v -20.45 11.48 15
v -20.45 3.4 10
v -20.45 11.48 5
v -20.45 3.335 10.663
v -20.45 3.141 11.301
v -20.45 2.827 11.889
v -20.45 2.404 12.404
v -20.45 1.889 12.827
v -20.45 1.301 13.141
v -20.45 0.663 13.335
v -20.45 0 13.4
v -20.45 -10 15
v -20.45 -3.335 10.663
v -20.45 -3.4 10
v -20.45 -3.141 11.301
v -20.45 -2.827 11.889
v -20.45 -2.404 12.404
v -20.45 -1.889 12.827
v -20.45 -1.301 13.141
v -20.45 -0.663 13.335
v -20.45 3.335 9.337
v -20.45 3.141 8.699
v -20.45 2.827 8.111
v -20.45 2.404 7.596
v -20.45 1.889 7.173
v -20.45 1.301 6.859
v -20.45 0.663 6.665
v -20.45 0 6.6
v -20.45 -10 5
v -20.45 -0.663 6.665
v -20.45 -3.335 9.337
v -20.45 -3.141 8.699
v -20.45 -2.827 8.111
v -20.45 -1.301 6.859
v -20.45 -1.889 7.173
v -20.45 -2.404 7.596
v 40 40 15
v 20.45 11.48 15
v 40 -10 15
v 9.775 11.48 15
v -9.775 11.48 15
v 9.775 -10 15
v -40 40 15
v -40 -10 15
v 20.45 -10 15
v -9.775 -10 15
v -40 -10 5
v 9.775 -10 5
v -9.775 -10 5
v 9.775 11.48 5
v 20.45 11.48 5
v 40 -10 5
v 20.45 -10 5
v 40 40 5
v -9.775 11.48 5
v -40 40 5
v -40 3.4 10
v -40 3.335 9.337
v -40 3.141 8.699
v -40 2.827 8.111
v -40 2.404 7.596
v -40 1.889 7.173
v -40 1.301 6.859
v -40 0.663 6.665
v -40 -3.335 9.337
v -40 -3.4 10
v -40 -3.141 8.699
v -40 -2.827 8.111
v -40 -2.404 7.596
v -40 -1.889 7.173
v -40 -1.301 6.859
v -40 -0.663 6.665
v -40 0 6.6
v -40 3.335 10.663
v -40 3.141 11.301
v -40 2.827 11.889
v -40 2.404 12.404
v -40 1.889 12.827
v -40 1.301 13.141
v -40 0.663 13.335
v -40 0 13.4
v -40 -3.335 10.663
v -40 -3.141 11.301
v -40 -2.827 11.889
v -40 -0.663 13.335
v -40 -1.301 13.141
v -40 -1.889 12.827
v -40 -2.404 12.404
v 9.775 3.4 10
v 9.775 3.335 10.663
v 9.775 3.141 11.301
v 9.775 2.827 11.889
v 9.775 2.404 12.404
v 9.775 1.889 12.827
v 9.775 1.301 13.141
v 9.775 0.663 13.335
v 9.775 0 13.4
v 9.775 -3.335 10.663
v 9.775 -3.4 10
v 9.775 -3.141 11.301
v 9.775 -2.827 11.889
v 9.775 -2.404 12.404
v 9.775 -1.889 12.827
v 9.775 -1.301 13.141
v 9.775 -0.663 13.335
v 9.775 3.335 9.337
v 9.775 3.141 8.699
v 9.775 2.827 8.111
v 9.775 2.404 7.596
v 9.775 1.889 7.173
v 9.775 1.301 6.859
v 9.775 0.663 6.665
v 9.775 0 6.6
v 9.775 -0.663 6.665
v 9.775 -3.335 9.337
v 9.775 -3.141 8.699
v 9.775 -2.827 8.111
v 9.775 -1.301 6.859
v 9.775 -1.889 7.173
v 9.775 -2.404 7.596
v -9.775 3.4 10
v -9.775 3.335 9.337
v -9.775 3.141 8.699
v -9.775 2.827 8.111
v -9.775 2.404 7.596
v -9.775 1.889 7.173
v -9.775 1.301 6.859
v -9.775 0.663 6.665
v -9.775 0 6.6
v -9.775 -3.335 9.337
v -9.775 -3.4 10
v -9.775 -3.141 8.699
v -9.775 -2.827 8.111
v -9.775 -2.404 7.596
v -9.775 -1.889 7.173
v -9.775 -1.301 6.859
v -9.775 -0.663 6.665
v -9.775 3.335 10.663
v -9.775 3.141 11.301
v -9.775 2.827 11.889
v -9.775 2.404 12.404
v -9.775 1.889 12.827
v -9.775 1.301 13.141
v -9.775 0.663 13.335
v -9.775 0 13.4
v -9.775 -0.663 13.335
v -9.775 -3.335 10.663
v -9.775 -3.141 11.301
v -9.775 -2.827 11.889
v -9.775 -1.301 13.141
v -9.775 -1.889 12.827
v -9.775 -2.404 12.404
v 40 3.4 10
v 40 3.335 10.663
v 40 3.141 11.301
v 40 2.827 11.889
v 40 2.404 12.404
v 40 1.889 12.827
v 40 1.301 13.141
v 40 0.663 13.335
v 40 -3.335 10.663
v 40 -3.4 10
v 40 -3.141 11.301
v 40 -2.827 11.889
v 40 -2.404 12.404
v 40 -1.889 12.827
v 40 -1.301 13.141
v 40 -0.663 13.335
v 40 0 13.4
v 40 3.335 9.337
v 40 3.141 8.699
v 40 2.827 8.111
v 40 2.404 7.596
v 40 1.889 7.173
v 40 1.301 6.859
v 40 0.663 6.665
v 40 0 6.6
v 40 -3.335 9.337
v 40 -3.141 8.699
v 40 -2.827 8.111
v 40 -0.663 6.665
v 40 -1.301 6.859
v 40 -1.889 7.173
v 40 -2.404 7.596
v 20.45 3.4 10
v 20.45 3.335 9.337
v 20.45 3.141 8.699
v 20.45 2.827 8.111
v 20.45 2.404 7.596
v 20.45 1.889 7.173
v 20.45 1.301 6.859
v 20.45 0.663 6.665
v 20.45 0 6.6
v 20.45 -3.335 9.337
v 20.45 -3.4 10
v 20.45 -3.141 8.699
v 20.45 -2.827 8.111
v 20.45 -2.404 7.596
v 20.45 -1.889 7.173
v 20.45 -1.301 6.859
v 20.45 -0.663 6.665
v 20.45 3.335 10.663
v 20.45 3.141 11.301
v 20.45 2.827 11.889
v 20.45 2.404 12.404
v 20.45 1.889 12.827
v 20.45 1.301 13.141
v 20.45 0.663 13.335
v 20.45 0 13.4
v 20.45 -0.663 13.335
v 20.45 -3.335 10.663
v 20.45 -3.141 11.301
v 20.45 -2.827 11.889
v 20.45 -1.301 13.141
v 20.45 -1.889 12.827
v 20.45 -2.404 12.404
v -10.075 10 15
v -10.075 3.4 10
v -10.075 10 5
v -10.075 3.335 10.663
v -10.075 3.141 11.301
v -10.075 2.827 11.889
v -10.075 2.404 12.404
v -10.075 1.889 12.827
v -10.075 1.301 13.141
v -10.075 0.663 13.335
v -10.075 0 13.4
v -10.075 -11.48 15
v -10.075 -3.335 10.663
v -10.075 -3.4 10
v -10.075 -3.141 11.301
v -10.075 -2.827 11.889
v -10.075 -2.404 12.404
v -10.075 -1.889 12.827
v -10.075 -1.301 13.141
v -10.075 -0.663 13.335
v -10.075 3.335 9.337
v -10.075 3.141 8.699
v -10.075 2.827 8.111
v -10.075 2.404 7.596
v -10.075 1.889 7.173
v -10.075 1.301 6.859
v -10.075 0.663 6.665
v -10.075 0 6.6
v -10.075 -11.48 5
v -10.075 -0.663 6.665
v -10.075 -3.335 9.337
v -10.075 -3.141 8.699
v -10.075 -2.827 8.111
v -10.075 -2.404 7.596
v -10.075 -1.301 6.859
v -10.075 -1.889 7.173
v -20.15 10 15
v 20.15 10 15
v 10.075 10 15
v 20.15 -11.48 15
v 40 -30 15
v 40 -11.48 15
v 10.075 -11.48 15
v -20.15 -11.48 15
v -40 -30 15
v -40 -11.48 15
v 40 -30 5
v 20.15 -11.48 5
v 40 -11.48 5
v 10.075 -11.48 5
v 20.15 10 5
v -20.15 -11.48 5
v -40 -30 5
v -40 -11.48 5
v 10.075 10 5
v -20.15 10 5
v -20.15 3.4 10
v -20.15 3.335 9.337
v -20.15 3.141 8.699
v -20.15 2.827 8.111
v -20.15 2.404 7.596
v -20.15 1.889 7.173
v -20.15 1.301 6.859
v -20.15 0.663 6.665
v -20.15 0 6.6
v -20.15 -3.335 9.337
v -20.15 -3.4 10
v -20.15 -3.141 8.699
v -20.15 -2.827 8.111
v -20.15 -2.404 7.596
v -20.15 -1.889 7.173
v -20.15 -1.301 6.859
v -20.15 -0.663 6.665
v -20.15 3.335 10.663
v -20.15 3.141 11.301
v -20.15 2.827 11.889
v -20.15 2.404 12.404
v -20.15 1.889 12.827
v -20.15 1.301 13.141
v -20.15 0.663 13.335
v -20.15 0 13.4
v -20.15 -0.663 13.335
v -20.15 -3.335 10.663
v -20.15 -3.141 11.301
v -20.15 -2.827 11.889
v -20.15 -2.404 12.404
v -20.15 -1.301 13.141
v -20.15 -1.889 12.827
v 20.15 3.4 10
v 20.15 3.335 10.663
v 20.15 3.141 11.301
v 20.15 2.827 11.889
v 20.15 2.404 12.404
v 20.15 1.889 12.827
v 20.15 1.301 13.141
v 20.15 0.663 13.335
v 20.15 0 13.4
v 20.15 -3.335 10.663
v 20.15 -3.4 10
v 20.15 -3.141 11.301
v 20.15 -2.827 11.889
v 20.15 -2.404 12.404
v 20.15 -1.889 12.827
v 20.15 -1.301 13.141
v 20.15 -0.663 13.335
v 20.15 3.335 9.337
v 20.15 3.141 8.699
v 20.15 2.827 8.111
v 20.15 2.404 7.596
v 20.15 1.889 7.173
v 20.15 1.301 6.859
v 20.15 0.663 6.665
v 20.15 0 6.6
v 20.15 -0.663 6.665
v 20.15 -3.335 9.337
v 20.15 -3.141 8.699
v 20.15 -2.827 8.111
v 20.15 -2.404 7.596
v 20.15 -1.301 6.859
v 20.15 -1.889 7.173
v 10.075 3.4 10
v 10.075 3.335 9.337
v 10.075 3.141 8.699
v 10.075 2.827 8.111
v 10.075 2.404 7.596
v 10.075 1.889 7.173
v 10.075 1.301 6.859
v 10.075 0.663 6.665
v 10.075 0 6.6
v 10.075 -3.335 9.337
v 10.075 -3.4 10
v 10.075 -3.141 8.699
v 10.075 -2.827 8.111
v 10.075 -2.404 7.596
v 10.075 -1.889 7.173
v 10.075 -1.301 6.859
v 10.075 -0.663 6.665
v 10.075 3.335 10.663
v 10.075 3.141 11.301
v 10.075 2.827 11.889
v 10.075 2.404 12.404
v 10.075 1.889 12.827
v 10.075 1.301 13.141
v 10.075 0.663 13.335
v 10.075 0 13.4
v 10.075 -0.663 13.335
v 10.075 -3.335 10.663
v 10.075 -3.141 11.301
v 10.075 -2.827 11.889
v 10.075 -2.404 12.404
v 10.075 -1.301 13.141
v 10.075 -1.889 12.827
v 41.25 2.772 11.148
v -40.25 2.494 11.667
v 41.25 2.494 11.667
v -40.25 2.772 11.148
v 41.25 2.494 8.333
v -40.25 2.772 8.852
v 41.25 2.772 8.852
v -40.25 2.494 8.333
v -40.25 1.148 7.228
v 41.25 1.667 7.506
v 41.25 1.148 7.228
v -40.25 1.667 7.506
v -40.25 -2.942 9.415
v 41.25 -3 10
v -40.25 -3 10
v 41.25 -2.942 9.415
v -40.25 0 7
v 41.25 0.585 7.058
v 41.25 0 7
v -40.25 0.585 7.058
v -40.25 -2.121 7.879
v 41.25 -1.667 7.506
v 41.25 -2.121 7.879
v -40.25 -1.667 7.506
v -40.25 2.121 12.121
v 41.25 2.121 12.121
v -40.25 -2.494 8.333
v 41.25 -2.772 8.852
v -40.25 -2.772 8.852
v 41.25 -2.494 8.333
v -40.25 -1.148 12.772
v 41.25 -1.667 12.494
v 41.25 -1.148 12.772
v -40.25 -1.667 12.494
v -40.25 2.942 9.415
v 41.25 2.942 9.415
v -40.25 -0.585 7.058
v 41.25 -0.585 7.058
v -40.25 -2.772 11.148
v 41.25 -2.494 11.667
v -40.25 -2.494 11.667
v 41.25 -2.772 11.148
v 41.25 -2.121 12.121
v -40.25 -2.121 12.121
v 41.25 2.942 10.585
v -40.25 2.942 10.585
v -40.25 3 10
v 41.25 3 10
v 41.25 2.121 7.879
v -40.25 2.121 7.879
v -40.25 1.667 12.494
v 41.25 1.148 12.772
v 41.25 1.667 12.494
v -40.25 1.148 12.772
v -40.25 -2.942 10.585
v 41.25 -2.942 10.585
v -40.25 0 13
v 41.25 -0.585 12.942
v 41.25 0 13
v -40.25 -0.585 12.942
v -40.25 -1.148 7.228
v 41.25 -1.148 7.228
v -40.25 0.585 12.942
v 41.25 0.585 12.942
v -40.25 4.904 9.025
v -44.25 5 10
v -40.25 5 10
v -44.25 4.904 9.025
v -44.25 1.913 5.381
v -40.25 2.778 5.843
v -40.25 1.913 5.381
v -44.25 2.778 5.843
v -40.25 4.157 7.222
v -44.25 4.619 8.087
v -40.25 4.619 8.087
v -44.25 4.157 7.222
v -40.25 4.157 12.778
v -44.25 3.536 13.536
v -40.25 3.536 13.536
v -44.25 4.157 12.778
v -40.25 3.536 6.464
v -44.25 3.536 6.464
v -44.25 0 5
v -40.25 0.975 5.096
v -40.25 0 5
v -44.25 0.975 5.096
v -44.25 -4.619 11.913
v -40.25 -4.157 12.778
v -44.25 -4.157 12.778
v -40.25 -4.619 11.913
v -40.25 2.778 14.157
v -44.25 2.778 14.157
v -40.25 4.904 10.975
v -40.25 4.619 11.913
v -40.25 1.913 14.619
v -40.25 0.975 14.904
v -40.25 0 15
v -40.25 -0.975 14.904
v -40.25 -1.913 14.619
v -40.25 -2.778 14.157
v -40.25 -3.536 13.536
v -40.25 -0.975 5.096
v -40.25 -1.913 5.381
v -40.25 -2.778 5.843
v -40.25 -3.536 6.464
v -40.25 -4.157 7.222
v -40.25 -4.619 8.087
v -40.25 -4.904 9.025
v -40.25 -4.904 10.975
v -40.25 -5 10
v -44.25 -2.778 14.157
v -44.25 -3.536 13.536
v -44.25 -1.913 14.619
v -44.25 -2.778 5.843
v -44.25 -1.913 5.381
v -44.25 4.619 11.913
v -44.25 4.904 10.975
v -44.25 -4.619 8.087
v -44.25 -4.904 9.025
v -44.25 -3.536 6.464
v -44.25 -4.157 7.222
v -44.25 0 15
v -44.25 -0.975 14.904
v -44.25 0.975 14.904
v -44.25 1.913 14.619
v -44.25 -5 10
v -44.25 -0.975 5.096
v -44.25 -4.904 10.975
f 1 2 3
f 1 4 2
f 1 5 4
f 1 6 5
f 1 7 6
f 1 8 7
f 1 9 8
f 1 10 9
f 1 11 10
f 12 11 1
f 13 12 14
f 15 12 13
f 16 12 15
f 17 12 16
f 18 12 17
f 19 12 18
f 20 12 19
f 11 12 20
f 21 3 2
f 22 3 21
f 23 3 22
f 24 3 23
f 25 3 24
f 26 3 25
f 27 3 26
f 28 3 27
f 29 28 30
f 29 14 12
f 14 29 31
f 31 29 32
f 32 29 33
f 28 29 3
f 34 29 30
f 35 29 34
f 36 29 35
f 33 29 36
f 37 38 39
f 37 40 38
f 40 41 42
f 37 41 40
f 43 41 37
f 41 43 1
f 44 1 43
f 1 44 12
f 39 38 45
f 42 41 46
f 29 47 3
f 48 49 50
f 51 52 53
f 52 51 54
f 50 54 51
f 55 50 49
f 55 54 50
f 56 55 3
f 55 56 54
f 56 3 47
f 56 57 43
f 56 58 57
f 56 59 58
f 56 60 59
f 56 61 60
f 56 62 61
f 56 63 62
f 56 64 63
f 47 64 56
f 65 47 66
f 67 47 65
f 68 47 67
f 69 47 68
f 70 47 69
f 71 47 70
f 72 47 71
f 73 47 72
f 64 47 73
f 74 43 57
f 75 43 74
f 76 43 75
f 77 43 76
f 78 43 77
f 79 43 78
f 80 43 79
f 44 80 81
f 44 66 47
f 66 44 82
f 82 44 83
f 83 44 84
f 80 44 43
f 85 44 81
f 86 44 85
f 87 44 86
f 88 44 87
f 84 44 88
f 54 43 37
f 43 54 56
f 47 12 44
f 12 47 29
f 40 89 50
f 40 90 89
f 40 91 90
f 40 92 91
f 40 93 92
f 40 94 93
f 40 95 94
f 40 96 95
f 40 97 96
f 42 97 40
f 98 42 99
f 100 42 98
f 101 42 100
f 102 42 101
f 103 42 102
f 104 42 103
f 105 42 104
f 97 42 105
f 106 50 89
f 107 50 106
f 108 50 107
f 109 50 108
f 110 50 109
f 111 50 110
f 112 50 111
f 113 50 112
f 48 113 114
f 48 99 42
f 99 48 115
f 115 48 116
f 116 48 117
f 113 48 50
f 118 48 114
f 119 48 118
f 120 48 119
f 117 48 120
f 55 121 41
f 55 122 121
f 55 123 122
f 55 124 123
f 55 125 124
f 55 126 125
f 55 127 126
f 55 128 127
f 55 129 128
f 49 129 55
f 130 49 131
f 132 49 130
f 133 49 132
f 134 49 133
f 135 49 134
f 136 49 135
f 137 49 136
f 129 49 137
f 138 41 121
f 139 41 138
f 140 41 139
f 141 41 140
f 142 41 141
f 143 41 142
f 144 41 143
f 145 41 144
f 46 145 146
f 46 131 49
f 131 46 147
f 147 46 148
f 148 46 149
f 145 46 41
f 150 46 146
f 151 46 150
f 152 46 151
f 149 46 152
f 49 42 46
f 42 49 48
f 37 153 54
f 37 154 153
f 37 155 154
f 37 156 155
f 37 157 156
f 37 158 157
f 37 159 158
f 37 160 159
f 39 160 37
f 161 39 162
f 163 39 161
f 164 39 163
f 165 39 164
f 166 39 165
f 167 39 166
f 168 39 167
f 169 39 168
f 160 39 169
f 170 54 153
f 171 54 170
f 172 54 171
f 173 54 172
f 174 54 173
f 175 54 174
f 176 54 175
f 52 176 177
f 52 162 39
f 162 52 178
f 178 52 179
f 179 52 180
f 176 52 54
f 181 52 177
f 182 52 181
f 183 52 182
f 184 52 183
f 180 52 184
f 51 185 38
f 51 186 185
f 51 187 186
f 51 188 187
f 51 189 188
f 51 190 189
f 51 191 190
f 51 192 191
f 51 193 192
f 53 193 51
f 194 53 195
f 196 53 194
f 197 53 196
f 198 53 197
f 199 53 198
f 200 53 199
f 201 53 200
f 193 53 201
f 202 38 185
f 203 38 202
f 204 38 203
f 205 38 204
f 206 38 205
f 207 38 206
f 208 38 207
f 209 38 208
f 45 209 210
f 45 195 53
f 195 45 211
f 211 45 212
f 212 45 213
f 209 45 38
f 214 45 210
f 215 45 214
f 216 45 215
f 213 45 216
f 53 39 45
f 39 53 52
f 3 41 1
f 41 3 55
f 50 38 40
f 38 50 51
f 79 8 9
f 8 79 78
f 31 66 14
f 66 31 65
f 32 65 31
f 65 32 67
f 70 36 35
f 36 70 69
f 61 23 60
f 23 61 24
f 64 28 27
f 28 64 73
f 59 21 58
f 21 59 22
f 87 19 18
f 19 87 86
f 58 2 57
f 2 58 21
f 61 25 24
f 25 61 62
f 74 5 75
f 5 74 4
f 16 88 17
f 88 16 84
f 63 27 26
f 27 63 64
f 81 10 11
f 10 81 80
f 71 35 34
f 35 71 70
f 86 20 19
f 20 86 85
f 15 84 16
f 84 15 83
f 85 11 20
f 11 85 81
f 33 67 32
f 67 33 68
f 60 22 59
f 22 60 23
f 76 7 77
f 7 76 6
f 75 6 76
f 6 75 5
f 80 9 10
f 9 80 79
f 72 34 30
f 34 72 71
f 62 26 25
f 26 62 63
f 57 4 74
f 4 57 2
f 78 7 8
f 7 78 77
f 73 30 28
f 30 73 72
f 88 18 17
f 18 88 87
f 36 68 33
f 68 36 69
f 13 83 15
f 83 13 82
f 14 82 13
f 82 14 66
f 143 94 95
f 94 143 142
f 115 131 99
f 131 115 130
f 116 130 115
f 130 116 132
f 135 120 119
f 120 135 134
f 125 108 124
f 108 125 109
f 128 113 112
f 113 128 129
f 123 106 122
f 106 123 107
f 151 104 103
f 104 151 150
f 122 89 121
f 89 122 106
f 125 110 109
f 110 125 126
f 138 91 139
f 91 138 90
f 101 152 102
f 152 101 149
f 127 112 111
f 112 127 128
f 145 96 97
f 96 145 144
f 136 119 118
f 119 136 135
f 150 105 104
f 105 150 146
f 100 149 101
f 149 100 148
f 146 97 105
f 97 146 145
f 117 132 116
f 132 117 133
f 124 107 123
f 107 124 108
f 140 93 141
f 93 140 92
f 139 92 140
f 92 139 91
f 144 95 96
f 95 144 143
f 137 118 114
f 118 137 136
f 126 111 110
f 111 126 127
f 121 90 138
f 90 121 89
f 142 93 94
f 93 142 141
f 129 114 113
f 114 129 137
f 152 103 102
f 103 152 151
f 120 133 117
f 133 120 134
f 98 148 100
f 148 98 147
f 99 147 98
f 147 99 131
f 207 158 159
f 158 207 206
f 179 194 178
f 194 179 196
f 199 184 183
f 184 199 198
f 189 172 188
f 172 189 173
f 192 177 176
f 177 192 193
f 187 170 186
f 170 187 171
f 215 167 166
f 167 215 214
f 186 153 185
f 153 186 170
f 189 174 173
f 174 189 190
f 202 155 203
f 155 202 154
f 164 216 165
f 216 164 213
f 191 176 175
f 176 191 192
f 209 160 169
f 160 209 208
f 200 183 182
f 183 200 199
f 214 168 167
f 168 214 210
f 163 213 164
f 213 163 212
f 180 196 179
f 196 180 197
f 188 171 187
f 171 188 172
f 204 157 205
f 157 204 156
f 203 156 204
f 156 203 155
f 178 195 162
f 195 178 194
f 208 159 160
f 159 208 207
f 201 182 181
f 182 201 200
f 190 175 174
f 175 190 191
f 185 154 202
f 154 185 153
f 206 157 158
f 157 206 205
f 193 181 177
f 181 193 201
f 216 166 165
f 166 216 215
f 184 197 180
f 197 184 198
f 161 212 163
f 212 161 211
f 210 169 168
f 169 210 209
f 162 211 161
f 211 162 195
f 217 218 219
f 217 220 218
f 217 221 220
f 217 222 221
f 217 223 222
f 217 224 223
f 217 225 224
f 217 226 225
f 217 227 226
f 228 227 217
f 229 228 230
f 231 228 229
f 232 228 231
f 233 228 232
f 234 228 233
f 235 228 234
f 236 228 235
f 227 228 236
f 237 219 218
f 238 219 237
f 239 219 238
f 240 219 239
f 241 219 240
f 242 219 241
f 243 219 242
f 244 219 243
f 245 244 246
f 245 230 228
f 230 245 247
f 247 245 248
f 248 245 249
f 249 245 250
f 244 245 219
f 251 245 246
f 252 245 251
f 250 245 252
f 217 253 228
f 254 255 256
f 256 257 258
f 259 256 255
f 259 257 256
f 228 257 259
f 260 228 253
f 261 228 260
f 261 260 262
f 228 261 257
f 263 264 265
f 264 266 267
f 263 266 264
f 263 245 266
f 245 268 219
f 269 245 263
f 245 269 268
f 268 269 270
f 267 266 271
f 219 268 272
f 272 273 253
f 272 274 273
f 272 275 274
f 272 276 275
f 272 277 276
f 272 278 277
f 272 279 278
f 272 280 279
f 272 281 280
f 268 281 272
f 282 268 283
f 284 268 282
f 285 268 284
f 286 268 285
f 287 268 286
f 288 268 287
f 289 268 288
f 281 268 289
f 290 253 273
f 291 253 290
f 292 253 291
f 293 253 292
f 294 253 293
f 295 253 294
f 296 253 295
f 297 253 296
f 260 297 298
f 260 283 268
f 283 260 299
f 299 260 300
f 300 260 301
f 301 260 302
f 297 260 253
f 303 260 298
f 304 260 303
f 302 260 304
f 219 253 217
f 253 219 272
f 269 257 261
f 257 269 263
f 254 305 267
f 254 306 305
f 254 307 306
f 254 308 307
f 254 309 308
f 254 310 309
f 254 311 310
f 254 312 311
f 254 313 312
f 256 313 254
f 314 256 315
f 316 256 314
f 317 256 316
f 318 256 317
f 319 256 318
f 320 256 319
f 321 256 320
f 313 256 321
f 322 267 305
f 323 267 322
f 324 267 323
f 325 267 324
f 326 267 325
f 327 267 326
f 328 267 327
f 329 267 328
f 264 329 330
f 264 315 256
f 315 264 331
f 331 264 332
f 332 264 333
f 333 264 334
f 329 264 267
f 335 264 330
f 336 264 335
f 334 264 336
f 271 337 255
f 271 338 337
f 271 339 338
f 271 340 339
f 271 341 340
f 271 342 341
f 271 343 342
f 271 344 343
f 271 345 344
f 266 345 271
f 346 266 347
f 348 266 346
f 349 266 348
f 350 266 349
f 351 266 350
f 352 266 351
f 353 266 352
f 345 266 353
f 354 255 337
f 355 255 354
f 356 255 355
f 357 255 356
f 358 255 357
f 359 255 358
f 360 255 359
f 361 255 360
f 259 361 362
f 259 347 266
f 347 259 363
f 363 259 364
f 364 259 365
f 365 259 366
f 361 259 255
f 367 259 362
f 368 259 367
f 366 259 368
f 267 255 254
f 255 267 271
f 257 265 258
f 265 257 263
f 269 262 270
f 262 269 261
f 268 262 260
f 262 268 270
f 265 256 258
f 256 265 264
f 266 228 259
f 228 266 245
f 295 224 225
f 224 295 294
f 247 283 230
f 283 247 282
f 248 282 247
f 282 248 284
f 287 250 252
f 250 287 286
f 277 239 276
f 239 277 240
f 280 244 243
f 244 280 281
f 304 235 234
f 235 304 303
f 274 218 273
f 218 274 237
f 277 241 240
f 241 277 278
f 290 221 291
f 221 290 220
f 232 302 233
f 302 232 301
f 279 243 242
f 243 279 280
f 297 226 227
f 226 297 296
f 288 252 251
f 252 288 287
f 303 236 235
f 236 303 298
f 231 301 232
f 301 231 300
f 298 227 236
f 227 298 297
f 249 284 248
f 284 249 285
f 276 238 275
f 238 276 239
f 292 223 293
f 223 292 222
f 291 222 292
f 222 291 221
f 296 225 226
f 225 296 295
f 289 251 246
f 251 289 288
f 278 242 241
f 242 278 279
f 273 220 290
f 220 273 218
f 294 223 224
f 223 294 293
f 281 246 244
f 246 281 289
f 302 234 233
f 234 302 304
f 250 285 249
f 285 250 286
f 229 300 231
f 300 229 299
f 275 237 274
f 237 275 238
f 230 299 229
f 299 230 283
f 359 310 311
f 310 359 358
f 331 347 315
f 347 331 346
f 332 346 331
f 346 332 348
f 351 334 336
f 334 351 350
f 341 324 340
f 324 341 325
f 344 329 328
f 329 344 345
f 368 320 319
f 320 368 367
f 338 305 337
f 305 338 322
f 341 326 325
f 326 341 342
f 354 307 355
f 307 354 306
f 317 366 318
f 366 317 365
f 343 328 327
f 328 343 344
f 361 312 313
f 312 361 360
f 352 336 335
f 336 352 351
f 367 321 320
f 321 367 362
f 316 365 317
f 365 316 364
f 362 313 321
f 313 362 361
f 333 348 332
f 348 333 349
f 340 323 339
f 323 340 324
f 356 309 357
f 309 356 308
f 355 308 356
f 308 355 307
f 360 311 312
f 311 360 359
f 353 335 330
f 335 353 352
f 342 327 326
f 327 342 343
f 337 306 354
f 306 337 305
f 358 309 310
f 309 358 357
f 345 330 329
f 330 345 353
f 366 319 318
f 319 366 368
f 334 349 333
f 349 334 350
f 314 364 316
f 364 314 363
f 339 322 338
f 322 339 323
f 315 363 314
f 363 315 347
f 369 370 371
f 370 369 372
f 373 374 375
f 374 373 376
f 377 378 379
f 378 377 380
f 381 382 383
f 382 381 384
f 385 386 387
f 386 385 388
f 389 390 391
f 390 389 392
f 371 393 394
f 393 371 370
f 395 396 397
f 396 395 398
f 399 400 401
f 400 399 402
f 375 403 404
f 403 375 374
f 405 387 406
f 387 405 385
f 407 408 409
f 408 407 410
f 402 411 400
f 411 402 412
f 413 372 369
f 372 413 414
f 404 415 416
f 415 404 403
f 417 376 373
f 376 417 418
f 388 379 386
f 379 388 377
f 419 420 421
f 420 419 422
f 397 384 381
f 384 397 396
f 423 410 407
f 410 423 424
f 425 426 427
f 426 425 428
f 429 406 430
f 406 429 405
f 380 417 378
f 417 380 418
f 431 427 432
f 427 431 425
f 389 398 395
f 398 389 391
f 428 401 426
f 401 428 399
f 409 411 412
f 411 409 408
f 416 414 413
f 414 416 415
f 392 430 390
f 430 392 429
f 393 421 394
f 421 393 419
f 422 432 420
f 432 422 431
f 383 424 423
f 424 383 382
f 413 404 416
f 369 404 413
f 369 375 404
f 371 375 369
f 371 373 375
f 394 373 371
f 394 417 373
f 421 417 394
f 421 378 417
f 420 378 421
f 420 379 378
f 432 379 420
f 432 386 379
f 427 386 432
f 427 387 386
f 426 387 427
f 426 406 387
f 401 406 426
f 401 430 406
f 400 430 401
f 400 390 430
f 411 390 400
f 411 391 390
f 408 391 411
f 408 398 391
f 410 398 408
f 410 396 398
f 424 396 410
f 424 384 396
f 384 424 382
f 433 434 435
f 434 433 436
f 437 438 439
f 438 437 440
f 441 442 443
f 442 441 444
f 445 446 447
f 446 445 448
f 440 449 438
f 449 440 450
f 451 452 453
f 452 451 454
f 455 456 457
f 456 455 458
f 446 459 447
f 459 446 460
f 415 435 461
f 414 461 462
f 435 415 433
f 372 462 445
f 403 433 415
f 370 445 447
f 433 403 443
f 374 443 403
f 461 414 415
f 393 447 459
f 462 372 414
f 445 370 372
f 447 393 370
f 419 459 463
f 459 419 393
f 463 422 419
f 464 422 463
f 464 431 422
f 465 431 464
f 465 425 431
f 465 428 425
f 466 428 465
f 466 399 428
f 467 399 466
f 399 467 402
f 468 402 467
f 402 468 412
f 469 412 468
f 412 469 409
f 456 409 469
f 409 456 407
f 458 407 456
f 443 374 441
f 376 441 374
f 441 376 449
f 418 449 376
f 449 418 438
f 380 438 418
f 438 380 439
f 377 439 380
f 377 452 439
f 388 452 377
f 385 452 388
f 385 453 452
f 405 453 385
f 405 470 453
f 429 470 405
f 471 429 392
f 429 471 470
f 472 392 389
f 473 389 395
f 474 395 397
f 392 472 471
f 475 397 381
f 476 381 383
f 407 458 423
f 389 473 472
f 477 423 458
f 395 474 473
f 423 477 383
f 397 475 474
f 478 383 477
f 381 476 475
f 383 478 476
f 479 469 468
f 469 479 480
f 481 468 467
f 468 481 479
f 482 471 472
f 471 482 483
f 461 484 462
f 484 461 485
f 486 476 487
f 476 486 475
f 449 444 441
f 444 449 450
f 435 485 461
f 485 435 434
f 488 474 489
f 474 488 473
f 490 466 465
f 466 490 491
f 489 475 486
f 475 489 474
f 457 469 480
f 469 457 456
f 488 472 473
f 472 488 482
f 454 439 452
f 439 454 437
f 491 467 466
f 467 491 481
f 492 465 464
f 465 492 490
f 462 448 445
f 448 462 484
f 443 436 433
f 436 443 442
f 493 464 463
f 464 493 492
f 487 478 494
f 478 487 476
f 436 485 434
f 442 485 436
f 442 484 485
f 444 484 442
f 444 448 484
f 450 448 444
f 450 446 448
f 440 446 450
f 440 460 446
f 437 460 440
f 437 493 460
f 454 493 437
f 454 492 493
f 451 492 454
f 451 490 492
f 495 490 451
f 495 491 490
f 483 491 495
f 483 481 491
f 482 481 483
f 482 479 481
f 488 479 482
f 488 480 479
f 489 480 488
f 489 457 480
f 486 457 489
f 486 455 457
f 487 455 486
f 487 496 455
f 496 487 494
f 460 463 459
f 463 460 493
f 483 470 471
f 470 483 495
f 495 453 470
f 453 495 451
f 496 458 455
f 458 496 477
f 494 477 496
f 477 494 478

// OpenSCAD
$fn = 32;

// ------------------------------------------------------------------------
// Butt hinge: hinge 80 mm, leaf swung 0 deg
// Every part is its own module, assembly() places every instance.
// ------------------------------------------------------------------------

// --- part 1 ---
module hinge_base() {
  difference() {
    union() {
      translate([-40, -10, -5]) cube([19.55, 50, 10]);
      translate([-9.775, -10, -5]) cube([19.55, 50, 10]);
      translate([20.45, -10, -5]) cube([19.55, 50, 10]);
      translate([-40, 11.48, -5]) cube([80, 28.52, 10]);
    }
    translate([-30.225, 0, 0]) rotate([0, 90, 0]) cylinder(h = 21.55, d = 6.8, center = true);
    translate([0, 0, 0]) rotate([0, 90, 0]) cylinder(h = 21.55, d = 6.8, center = true);
    translate([30.225, 0, 0]) rotate([0, 90, 0]) cylinder(h = 21.55, d = 6.8, center = true);
  }
}

// --- part 2 ---
module hinge_mover() {
  difference() {
    union() {
      translate([-20.15, -30, -5]) cube([10.075, 40, 10]);
      translate([10.075, -30, -5]) cube([10.075, 40, 10]);
      translate([-40, -30, -5]) cube([80, 18.52, 10]);
    }
    translate([-15.113, 0, 0]) rotate([0, 90, 0]) cylinder(h = 12.075, d = 6.8, center = true);
    translate([15.113, 0, 0]) rotate([0, 90, 0]) cylinder(h = 12.075, d = 6.8, center = true);
  }
}

// --- part 3 ---
module hinge_pin() {
  rotate([0, 90, 0]) cylinder(h = 82.5, d = 6, center = true);
  translate([-44.25, 0, 0]) rotate([0, 90, 0]) cylinder(h = 4, d = 10);
}

// --- assembly ---
module assembly() {
  color([0.80, 0.24, 0.20]) translate([0, 0, 10]) rotate([0, 0, 0]) hinge_base();
  color([0.20, 0.45, 0.75]) translate([0, 0, 10]) rotate([0, 0, 0]) hinge_mover();
  color([0.25, 0.62, 0.32]) translate([0, 0, 10]) rotate([0, 0, 0]) hinge_pin();
}

assembly();
